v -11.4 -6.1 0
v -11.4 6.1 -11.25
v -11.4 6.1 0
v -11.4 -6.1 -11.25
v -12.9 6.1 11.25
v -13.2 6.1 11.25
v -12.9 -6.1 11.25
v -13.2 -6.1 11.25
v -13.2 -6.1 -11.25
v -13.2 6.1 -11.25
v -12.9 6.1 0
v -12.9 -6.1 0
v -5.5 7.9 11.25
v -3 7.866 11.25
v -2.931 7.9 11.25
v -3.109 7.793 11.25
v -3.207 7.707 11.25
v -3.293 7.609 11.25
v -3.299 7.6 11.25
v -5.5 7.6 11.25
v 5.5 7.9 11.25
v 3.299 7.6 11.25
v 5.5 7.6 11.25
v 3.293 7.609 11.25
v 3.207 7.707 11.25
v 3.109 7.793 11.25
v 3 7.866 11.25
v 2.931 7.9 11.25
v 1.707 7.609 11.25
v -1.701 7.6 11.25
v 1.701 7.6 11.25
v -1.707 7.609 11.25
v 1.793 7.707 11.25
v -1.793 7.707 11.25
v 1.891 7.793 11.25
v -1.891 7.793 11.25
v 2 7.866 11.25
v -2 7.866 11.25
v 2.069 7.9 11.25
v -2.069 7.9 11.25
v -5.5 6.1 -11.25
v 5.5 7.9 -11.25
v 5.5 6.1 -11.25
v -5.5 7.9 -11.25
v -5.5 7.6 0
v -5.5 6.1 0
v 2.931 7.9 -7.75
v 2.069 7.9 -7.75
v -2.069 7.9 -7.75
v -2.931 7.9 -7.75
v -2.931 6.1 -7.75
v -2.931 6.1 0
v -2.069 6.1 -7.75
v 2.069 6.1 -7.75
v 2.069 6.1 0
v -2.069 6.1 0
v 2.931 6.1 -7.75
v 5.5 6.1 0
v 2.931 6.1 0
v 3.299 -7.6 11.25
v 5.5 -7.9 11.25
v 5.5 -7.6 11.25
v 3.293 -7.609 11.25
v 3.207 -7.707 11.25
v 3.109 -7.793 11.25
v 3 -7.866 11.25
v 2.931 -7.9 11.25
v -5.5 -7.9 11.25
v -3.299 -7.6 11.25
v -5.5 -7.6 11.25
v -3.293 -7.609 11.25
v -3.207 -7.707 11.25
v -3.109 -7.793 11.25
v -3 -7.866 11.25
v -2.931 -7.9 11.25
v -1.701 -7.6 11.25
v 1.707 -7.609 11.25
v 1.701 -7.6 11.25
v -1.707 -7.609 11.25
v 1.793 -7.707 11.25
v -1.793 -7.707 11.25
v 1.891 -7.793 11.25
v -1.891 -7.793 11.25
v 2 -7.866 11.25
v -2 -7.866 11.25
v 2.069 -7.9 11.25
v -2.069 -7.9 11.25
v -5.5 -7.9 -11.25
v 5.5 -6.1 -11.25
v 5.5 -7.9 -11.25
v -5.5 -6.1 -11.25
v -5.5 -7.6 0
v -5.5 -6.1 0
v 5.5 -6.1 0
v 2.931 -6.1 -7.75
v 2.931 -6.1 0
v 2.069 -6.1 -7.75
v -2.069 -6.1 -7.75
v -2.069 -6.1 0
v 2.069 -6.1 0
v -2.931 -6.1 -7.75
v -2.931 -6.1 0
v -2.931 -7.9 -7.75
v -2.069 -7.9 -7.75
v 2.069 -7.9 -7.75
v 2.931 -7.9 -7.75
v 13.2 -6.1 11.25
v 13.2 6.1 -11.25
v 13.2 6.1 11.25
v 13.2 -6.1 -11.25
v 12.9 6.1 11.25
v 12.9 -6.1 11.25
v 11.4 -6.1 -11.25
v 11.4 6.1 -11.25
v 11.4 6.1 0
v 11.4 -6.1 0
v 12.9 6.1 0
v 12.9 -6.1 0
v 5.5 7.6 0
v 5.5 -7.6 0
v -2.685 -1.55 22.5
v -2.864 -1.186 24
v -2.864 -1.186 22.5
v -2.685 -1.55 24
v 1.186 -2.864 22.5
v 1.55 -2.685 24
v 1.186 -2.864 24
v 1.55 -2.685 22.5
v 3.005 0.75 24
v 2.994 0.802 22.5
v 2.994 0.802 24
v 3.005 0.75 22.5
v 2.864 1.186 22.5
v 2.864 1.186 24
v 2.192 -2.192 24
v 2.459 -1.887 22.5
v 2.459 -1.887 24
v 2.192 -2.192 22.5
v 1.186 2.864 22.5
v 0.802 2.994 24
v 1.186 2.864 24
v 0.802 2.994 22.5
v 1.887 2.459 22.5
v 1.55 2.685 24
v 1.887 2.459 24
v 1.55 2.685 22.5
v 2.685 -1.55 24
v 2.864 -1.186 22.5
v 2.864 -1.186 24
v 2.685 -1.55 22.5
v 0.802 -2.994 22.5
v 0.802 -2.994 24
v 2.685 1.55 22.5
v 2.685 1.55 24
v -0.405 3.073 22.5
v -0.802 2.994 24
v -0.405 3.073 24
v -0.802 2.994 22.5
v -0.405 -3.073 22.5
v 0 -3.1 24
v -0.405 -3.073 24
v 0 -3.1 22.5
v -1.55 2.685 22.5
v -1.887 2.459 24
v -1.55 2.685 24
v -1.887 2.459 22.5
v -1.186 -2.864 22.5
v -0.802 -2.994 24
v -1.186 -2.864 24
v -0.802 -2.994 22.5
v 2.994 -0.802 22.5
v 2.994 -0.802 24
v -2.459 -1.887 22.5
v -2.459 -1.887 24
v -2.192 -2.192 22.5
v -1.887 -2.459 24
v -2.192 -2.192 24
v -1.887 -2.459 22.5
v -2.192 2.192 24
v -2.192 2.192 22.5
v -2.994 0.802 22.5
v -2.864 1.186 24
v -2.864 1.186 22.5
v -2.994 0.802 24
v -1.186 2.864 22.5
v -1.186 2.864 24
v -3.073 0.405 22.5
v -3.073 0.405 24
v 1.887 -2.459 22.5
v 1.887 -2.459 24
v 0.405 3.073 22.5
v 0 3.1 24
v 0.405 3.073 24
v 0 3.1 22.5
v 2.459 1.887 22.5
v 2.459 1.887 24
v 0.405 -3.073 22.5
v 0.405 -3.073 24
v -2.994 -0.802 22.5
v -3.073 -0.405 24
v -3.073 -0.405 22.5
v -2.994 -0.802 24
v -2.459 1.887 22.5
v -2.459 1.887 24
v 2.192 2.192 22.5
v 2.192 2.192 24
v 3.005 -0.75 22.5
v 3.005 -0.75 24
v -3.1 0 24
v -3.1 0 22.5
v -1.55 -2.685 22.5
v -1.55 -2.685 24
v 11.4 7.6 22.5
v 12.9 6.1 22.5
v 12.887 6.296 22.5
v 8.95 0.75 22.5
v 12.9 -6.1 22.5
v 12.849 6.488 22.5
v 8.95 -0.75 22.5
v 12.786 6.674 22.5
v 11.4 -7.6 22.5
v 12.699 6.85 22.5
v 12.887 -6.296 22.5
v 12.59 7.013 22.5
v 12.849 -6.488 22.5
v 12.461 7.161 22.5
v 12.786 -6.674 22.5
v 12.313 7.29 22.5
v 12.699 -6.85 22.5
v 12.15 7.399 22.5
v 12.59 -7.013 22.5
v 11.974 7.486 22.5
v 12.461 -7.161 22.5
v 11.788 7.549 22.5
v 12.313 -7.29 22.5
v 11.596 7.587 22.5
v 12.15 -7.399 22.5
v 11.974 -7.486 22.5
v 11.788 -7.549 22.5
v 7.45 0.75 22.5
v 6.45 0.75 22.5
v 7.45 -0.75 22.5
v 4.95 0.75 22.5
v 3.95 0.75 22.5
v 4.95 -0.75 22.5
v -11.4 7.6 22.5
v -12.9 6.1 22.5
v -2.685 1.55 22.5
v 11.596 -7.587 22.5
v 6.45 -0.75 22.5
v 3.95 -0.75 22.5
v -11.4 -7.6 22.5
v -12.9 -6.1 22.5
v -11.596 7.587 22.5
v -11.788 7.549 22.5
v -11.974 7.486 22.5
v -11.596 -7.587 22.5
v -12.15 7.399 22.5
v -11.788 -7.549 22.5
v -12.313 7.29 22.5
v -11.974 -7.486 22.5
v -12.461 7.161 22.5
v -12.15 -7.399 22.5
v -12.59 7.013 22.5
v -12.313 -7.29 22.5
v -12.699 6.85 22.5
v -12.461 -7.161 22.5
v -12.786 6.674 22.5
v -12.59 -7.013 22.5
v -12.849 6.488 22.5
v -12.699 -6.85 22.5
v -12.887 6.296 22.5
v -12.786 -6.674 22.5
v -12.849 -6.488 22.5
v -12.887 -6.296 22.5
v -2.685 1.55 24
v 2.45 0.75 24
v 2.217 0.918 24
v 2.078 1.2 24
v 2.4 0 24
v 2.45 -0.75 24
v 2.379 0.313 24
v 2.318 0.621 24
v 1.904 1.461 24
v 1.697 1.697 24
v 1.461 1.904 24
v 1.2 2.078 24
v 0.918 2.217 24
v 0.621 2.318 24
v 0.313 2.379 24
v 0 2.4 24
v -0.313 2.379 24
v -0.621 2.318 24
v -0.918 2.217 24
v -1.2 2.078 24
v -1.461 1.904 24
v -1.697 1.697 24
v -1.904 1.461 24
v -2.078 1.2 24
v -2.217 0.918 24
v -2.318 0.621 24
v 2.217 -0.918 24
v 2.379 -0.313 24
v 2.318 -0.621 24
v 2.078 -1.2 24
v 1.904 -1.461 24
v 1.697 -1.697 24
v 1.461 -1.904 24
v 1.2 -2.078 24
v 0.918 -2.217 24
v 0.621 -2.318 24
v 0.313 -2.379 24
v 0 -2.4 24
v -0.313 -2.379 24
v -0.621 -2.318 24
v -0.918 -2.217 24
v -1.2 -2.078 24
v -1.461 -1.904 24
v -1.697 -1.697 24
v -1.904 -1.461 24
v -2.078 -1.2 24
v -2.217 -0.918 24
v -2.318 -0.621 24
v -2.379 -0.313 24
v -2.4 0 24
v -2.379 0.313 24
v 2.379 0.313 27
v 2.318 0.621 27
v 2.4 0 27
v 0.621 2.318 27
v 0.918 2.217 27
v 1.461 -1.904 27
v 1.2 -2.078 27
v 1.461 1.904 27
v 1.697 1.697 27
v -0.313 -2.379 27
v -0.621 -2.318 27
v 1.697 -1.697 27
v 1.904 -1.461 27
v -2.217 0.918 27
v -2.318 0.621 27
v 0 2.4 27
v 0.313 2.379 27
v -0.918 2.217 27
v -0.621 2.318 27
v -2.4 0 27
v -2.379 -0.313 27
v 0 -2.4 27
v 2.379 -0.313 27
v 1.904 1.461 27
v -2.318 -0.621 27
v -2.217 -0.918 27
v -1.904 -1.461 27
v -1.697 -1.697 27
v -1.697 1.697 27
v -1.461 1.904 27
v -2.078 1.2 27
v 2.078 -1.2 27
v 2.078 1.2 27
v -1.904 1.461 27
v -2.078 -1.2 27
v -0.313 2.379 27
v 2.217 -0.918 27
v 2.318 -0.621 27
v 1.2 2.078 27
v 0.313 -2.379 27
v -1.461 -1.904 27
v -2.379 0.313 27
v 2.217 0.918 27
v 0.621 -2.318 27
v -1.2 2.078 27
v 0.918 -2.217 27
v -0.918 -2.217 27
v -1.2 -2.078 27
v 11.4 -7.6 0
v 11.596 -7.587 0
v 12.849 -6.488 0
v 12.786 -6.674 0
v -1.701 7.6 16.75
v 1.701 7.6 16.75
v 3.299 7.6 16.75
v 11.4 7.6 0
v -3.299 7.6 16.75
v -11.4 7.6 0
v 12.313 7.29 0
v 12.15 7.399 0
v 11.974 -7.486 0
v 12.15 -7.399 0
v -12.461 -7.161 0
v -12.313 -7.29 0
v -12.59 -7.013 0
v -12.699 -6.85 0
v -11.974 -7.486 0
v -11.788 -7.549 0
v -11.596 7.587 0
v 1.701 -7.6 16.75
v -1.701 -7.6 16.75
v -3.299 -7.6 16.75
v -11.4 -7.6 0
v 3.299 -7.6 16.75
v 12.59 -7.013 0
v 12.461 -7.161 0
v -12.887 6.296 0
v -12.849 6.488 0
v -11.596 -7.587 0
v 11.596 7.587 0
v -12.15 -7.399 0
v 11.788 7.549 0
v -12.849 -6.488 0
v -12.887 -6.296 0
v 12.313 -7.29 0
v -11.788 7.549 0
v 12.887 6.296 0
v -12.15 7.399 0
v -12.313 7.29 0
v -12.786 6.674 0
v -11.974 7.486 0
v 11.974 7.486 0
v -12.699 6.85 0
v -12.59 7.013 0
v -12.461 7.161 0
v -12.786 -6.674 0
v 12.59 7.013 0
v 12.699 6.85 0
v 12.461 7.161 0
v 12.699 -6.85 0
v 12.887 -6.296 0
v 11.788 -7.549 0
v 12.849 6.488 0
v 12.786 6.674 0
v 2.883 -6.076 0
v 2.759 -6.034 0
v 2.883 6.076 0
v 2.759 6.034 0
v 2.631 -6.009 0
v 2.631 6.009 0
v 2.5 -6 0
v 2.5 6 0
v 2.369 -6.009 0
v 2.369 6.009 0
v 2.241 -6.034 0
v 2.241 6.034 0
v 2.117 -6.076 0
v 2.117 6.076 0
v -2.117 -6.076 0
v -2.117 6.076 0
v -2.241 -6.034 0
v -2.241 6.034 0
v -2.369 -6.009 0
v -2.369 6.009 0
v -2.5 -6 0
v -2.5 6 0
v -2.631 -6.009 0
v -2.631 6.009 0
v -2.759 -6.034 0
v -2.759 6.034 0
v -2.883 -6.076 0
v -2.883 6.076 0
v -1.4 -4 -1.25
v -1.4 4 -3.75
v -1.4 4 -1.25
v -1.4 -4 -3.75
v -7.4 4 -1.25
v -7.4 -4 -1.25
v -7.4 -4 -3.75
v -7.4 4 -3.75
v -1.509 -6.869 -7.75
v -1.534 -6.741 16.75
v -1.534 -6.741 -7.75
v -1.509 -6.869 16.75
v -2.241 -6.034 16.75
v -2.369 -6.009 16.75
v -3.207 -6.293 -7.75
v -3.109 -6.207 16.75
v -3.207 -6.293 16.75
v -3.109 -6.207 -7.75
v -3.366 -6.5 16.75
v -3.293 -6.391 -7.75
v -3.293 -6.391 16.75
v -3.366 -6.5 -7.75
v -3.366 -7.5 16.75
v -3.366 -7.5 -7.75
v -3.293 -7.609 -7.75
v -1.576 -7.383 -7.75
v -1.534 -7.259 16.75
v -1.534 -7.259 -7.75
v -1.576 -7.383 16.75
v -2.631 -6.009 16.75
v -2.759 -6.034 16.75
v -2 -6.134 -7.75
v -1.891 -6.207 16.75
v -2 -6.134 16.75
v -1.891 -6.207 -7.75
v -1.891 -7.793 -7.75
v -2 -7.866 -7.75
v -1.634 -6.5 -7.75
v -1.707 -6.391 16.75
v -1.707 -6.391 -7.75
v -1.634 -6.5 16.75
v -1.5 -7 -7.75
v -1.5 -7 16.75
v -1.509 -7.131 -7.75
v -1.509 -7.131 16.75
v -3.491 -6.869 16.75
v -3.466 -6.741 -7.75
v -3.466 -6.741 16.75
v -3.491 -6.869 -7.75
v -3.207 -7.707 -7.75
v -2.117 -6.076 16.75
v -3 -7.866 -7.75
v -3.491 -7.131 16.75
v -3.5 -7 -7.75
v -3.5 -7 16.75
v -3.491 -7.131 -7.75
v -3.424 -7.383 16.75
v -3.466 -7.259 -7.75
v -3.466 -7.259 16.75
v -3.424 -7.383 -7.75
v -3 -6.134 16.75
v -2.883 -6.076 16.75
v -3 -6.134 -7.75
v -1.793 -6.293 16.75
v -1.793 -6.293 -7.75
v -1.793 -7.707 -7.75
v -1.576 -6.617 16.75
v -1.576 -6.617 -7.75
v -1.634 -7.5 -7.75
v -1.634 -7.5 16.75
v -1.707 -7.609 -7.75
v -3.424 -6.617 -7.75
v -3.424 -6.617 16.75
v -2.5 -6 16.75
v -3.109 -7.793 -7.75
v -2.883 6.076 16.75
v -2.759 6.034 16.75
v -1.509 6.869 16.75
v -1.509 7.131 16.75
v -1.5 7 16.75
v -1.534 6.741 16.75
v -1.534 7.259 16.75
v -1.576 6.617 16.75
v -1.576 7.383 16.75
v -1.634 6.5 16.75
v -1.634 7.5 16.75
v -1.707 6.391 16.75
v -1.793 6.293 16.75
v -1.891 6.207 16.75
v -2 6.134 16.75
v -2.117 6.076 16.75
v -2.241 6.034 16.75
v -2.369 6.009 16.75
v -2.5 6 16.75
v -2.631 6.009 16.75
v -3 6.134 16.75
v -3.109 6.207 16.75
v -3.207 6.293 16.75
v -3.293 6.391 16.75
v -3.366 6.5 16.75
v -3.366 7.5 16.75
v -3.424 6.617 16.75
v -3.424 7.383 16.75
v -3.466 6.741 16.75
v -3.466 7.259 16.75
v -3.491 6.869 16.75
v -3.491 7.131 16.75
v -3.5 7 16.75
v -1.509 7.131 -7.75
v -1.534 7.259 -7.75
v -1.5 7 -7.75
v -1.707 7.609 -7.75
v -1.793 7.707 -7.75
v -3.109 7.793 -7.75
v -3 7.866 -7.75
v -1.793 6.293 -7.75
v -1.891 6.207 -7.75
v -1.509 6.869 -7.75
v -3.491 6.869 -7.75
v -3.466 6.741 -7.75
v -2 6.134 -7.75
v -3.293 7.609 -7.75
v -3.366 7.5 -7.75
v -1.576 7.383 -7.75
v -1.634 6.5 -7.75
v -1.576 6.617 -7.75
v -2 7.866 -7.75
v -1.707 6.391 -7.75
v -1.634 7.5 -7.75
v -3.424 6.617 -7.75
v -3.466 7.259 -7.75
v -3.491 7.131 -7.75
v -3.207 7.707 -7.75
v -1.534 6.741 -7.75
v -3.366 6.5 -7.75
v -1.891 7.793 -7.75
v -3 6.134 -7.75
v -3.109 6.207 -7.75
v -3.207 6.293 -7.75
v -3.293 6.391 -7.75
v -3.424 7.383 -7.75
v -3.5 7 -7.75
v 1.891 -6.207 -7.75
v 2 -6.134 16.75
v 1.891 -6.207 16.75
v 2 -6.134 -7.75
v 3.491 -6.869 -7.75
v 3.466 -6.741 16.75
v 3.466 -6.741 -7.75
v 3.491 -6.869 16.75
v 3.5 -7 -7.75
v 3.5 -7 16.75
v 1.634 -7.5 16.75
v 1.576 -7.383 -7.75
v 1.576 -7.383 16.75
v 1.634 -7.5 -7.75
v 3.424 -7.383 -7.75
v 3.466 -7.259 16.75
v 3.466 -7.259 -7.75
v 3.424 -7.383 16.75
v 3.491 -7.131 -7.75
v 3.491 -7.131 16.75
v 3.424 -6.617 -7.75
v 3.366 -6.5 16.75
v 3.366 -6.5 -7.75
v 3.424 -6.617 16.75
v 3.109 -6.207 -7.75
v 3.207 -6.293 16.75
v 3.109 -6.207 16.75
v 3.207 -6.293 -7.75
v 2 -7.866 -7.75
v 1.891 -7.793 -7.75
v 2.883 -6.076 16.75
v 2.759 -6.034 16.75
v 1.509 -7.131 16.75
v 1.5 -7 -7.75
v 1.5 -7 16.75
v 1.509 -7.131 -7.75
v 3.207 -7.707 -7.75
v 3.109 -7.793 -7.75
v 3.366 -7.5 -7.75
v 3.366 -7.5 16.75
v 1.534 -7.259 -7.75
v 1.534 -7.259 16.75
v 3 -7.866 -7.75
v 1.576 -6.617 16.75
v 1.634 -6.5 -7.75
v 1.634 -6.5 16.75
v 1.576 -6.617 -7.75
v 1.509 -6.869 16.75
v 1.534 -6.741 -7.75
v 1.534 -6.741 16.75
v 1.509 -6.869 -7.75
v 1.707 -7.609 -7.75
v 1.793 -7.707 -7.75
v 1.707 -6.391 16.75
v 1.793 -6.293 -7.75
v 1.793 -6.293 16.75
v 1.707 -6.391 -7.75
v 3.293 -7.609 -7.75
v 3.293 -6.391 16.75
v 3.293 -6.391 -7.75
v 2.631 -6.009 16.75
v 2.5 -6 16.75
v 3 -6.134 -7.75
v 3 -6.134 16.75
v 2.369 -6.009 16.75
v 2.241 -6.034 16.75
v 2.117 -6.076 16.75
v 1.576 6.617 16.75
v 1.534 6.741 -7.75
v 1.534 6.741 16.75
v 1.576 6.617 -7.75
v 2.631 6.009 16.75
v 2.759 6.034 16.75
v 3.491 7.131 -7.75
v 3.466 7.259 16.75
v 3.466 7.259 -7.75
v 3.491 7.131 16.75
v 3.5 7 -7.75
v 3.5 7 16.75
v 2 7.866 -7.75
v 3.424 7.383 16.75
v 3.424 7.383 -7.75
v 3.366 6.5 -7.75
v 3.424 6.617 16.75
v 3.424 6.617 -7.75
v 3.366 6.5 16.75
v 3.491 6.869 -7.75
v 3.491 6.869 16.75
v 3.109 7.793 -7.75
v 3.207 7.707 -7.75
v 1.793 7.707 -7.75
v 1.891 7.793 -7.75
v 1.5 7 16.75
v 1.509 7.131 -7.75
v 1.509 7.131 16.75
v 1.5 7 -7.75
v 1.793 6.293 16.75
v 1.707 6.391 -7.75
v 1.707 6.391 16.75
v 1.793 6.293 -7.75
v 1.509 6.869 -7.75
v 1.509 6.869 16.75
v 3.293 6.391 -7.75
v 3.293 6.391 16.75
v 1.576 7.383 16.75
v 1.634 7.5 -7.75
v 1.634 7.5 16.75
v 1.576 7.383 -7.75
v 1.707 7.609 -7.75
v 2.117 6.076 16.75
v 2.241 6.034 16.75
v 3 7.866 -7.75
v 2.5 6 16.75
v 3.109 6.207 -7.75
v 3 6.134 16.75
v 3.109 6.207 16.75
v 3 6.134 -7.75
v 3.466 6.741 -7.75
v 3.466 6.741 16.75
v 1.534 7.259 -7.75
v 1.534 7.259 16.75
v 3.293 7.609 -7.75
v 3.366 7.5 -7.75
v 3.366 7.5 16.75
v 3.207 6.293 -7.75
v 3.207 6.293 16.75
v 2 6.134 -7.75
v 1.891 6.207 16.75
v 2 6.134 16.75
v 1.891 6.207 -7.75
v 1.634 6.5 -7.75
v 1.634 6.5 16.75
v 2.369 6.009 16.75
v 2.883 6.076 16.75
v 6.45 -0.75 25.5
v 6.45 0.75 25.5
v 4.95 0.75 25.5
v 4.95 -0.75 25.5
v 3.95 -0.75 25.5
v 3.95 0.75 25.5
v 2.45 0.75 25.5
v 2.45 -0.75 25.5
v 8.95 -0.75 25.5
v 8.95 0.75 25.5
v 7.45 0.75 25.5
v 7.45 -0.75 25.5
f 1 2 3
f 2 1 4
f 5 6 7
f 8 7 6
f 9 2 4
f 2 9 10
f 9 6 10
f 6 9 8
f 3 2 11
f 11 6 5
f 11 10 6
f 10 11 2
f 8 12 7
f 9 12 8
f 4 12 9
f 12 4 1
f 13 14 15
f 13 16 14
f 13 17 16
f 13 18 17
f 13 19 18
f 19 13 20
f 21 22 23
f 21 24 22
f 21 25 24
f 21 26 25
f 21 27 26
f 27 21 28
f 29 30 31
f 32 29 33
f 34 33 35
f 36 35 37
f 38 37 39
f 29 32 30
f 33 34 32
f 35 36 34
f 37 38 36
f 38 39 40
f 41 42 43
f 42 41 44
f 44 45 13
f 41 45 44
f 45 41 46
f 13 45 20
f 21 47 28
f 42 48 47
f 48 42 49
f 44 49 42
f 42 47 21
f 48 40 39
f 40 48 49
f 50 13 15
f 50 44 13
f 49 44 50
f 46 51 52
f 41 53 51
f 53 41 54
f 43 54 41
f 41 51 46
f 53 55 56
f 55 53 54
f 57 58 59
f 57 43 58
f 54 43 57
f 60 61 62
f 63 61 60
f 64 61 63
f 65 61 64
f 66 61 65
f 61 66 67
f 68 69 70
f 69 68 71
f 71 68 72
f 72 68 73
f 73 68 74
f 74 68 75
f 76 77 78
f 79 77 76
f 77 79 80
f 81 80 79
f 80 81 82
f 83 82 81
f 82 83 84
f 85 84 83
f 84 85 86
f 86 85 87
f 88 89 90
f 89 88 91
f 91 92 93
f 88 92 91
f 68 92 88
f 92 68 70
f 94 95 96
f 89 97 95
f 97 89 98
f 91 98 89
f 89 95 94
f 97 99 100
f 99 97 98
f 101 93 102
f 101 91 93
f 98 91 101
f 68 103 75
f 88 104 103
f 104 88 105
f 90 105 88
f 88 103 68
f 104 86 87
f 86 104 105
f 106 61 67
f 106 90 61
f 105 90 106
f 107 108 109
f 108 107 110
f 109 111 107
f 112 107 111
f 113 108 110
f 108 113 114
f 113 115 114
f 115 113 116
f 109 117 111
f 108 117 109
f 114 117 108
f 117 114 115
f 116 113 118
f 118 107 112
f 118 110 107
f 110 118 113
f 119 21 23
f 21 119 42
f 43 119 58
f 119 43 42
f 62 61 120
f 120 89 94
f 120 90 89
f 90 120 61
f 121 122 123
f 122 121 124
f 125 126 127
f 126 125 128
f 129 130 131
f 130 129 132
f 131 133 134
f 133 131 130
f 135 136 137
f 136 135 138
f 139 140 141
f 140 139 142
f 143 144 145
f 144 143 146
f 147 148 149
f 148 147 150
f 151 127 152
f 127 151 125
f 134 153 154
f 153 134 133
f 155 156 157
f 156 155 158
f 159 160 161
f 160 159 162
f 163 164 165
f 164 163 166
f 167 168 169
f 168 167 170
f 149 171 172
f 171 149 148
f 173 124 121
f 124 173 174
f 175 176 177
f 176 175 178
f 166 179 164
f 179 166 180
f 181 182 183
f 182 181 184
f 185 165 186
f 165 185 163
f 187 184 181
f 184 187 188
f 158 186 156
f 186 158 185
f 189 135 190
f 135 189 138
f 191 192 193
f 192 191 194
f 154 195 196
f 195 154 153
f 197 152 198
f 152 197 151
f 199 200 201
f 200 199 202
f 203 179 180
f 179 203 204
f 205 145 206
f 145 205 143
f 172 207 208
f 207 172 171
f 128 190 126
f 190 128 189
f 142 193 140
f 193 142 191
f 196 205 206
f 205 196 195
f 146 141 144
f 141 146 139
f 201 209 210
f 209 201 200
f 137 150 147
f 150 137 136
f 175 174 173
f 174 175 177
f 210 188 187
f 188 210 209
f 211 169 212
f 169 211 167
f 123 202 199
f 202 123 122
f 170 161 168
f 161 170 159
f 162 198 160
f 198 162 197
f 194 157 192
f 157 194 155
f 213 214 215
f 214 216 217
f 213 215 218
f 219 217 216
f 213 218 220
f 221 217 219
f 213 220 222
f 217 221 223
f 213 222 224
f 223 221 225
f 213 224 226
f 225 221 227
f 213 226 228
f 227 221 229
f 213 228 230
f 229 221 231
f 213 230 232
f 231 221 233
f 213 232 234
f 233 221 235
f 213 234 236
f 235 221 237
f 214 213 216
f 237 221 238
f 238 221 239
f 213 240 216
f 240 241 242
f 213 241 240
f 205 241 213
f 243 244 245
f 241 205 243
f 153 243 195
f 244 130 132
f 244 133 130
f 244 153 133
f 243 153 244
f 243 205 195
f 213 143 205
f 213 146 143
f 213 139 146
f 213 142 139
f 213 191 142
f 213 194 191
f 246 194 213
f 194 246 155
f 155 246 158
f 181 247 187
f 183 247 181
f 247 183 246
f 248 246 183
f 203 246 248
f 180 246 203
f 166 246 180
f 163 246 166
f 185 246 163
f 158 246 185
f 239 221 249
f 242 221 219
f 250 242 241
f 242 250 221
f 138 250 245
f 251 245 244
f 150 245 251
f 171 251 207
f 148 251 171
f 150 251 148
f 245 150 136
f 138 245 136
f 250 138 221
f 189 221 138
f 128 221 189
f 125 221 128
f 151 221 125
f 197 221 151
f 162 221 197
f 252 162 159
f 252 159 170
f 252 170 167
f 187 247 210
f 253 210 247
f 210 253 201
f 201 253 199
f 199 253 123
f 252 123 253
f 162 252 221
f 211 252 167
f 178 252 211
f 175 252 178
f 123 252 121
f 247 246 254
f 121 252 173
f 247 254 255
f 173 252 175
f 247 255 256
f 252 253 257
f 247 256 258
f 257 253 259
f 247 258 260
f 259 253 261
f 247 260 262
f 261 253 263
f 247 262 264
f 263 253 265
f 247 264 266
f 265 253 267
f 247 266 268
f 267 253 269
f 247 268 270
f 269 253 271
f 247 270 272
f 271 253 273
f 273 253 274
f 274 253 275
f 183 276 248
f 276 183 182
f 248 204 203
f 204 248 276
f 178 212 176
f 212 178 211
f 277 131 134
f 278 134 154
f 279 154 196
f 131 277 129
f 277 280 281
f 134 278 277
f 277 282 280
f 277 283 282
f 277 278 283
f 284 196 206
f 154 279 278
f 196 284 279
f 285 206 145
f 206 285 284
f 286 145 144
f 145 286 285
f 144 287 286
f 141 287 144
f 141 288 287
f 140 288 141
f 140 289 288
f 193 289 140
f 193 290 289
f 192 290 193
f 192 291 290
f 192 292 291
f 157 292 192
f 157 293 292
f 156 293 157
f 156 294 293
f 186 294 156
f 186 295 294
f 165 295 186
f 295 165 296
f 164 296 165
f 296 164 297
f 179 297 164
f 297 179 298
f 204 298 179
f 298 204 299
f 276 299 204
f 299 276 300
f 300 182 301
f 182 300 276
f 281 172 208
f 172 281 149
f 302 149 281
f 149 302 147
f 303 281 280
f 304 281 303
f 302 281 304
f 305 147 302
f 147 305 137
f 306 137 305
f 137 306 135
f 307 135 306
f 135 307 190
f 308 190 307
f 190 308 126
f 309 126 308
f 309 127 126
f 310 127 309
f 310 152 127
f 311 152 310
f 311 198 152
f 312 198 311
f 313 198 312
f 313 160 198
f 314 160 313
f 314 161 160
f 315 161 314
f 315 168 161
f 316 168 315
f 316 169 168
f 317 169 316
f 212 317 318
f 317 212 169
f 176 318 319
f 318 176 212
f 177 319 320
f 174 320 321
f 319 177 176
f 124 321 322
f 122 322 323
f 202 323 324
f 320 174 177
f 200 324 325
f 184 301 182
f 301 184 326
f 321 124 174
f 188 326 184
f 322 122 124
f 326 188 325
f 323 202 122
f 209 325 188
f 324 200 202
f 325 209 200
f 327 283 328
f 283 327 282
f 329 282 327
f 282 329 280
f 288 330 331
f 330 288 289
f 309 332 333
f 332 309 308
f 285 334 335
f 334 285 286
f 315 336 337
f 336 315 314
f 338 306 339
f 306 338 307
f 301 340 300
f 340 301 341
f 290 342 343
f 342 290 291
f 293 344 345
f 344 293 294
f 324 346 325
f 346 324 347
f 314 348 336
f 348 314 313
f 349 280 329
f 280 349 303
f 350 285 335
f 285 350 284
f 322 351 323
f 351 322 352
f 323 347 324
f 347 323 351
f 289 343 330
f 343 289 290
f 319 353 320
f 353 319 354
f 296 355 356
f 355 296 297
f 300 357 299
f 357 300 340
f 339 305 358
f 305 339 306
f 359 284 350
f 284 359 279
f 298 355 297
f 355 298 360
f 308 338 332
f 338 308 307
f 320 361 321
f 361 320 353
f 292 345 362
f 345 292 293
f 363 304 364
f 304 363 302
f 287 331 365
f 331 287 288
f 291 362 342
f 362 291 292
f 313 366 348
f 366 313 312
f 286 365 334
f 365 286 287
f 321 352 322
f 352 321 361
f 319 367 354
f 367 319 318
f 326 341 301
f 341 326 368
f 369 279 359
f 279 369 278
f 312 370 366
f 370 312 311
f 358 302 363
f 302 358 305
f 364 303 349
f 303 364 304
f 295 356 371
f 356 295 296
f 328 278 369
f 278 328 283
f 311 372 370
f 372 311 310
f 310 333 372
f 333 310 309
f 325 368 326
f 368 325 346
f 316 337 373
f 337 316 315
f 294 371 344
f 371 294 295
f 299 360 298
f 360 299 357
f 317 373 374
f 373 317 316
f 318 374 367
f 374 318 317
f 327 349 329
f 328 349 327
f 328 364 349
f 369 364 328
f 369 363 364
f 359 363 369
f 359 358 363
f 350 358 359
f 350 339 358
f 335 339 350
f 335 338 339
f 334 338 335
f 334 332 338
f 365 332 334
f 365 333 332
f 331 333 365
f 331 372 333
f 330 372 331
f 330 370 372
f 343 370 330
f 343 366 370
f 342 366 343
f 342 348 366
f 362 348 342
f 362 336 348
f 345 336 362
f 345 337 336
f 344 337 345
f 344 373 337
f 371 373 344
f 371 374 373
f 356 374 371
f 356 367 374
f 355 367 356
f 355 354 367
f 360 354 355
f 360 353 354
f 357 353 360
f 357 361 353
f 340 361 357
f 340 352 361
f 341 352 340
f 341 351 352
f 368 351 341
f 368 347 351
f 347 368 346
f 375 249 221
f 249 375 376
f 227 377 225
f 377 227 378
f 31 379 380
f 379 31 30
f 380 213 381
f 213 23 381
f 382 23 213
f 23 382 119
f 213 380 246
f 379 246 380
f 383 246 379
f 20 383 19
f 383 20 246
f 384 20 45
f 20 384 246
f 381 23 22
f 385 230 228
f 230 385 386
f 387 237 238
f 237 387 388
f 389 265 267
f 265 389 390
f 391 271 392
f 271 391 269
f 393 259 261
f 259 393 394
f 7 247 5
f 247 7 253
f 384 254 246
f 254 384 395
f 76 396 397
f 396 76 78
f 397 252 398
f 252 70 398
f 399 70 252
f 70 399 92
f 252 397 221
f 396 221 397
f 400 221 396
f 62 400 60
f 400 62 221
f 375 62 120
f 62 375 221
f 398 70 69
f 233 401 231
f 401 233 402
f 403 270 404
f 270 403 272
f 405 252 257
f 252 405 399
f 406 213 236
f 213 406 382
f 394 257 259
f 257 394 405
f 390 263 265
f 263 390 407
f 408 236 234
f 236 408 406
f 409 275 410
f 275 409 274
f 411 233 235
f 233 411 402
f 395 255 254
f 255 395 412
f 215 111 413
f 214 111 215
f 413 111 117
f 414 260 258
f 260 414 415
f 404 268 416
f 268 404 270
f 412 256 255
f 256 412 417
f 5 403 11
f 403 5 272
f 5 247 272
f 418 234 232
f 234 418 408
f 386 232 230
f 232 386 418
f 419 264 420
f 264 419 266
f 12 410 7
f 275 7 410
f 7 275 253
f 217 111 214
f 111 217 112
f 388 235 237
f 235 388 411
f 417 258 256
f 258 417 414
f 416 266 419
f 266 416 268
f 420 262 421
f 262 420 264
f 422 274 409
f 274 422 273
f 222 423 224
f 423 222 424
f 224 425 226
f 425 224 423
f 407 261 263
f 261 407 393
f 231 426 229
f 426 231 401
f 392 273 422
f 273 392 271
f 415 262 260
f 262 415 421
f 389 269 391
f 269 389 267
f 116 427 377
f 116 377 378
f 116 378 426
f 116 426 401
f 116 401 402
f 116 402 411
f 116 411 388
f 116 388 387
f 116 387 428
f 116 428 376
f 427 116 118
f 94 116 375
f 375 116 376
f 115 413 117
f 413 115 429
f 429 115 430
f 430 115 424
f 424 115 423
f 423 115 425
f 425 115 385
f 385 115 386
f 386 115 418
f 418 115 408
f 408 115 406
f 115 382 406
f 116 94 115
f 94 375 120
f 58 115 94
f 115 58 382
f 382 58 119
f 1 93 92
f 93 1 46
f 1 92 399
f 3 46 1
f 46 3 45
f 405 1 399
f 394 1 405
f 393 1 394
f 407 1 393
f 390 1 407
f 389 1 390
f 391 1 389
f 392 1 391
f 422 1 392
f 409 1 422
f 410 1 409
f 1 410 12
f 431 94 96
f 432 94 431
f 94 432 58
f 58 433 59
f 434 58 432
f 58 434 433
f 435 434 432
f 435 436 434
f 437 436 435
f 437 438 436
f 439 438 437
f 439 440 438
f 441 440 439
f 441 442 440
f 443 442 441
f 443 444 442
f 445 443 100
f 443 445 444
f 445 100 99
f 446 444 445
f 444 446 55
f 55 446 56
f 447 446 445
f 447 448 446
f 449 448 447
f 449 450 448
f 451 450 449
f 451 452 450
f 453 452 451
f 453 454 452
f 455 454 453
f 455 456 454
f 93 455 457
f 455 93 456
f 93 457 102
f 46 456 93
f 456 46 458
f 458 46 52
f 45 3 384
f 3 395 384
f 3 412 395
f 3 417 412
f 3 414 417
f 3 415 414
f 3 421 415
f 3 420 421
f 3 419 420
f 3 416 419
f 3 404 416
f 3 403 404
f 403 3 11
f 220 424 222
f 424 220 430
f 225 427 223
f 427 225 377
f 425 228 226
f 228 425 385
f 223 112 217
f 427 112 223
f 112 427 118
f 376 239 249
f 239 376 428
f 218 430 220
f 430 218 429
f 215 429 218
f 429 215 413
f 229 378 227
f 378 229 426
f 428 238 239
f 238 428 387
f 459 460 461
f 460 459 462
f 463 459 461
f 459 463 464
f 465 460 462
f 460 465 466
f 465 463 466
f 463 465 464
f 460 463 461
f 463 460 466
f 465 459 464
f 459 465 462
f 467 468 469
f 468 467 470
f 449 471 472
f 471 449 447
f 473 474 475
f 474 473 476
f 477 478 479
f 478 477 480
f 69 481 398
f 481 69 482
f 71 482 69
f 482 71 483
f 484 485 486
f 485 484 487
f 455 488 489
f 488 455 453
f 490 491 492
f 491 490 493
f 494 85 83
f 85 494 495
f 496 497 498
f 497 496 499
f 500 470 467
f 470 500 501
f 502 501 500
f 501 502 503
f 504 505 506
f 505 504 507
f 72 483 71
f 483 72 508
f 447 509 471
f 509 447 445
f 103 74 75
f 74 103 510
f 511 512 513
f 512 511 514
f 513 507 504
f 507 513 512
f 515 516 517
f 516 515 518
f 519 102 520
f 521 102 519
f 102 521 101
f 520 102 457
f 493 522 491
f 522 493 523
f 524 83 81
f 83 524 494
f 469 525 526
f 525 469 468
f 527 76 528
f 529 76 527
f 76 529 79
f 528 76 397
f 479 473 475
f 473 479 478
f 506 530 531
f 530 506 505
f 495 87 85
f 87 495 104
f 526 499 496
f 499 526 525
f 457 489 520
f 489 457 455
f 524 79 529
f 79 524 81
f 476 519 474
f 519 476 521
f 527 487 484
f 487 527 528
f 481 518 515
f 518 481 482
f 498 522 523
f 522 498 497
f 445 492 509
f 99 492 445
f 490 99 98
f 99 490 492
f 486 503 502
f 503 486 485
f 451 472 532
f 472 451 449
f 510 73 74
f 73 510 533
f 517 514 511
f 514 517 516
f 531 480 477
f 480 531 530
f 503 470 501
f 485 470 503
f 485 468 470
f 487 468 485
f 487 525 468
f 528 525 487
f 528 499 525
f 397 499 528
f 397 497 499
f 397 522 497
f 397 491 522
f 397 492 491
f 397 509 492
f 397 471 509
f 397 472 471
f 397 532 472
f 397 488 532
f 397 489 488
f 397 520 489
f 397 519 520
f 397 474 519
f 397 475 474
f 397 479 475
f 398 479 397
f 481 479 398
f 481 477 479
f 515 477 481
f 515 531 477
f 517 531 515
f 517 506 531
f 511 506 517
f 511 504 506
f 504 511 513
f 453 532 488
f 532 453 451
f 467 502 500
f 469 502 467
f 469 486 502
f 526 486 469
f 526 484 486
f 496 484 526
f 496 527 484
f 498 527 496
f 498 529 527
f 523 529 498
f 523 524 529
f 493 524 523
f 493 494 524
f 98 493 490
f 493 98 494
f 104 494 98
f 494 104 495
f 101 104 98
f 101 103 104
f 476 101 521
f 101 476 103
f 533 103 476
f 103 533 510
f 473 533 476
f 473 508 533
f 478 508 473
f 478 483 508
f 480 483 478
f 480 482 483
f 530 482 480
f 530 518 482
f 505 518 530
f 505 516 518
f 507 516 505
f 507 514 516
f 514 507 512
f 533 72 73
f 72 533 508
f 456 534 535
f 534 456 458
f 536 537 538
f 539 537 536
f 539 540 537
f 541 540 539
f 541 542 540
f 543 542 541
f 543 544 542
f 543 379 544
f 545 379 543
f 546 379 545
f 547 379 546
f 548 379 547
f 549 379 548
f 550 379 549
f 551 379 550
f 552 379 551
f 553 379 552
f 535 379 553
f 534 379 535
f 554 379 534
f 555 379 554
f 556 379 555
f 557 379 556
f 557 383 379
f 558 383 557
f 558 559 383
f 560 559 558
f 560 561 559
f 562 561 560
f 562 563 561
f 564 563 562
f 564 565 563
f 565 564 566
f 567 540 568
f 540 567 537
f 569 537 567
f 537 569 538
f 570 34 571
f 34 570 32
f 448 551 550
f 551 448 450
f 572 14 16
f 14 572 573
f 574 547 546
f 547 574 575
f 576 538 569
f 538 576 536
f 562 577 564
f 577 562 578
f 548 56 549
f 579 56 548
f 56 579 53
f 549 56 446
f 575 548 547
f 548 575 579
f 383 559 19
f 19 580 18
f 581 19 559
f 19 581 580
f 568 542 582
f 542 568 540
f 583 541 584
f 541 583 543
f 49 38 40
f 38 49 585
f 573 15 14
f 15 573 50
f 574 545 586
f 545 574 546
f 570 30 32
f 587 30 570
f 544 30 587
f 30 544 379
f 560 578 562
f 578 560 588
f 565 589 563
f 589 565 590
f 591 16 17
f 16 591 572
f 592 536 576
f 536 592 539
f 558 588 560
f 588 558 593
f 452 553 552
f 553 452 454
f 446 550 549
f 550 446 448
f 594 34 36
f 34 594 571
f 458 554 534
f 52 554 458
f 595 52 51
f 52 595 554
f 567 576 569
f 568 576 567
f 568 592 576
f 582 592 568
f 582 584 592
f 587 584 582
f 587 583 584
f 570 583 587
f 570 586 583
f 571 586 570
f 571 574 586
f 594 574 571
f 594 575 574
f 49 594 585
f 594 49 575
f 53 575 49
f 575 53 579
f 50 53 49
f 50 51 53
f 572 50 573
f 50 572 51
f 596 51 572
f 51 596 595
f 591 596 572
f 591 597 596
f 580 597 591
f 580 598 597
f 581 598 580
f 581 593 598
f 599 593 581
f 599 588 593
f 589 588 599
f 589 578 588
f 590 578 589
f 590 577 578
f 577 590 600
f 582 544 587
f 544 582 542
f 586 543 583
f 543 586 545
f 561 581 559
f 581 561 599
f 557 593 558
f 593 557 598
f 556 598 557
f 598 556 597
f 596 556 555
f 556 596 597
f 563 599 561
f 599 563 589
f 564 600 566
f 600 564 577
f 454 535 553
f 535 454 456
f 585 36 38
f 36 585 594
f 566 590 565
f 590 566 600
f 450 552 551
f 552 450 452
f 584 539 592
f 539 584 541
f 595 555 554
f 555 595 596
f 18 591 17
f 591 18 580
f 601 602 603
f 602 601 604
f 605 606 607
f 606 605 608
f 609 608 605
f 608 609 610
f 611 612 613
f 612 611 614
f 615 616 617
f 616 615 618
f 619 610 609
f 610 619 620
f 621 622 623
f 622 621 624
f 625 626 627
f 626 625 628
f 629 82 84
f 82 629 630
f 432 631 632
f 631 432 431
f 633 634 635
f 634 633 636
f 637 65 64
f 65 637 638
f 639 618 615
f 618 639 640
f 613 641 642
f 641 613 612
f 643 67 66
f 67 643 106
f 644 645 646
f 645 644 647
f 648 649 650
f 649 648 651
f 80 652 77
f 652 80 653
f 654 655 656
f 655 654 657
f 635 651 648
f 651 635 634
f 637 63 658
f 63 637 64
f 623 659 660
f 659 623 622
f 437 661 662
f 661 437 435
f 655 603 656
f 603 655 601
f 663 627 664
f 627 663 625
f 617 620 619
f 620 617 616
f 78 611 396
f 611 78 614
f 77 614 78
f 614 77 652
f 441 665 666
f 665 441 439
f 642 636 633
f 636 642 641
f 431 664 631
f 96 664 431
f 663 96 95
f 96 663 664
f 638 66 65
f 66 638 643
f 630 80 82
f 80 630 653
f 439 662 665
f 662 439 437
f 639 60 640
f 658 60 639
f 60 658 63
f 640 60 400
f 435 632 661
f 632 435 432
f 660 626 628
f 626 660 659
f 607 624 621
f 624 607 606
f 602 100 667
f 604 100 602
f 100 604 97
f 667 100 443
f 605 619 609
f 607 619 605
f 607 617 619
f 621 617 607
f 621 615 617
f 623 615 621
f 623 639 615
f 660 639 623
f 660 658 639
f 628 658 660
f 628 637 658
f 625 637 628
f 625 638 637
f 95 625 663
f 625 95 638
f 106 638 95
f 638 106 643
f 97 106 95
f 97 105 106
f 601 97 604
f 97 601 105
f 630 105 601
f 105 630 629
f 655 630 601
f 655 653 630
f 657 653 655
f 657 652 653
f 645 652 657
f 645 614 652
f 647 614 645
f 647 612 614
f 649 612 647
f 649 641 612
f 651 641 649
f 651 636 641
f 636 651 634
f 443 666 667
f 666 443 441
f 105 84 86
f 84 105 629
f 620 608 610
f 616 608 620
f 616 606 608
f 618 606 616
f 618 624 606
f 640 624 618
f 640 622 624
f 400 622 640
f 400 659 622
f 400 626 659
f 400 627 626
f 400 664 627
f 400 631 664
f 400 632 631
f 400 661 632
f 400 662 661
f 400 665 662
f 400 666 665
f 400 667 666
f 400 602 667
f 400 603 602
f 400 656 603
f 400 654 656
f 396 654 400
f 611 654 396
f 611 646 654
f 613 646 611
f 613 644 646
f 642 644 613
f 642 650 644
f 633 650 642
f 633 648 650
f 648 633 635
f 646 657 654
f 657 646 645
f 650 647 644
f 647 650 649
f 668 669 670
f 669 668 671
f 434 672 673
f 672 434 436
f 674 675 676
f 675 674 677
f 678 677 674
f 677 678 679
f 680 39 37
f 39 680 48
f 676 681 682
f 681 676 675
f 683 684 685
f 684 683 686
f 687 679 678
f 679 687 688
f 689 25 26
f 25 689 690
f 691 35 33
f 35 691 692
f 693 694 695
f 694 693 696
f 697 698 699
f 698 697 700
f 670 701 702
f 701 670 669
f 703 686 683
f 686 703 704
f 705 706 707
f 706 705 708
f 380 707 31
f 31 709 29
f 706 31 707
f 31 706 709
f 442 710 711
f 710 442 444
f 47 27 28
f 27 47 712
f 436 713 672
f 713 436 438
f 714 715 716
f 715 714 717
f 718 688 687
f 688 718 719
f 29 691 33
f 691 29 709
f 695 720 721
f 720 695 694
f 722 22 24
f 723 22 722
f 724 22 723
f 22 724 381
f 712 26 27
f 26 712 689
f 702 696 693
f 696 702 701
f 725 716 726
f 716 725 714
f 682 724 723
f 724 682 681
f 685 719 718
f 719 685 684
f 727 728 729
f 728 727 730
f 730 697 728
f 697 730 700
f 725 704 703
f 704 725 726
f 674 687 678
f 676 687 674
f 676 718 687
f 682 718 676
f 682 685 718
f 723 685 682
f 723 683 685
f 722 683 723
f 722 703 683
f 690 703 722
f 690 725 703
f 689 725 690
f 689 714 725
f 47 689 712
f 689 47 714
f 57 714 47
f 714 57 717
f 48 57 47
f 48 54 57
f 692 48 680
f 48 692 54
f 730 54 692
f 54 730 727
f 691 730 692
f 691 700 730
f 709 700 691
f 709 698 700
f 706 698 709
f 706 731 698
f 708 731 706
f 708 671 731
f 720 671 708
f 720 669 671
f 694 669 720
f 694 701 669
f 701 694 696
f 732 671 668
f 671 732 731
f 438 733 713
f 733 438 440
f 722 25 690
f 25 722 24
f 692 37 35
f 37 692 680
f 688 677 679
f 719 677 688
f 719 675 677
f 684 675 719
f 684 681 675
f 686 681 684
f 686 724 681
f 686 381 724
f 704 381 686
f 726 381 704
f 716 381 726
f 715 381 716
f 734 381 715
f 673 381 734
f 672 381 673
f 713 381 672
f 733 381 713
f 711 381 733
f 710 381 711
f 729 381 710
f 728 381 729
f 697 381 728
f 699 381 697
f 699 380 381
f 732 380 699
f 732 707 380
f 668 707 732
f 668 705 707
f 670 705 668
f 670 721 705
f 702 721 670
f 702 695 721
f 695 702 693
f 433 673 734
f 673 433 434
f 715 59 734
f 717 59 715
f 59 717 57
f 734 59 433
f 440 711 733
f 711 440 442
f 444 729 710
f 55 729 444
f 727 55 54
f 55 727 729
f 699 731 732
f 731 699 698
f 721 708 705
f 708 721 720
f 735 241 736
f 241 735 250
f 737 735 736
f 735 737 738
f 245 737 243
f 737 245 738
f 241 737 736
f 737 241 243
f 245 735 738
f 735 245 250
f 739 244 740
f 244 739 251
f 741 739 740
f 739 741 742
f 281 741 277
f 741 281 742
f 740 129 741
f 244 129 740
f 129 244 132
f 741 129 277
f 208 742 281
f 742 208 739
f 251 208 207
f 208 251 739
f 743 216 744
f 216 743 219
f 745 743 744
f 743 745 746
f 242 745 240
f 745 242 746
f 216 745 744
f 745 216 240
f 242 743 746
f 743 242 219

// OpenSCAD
// MG90S Micro Servo — parametric model (mop lift servo for OOMWOO)
// ===============================================================
// Source: Tower Pro MG90S datasheet / multiple vendor spec sheets
//   - Body (w/o ears): ~22.8 × 12.2 × 22.5 mm
//   - With mounting ears: ~32.2 × 12.2 × 28.5 mm (L×W×H)
//   - Splined output shaft: ~Φ4.8 mm (25T spline)
//   - Mounting: 4× ear holes, M2 typical, ~46.5 mm diag spread
//   - Used for: 2x mop lift servos (mop motor assembly)
// ===============================================================
// Status: DRAFT — datasheet-based, UNVERIFIED against real part.
// See MEASURE-ME.md for caliper checks needed.

/* [Dimensions — verify against real part] */
body_w         = 12.2;    // body width (mm)
body_d         = 22.8;    // body depth (front-to-back, mm)
body_h         = 22.5;    // body height excluding ears (mm)
ear_thick      = 1.8;     // mounting ear thickness (mm)
ear_width      = 6.0;     // mounting ear width (mm)
ear_offset     = 2.5;     // ear inset from body edge
ear_hole_d     = 2.0;     // mounting hole diameter (M2)
ear_hole_y     = 4.5;     // hole center from ear base (mm)
body_round_r   = 1.5;     // body corner rounding (approximate)

spline_d       = 4.8;     // output spline diameter (mm)
spline_h       = 3.0;     // spline height from body (mm)
spline_collar_d = 6.2;    // collar below spline (mm)
spline_collar_h = 1.5;    // collar height (mm)

// Connector protrusion (bottom)
conn_h         = 2.5;     // connector height below body (mm)
conn_w         = 8.0;     // connector width (mm)
conn_d         = 6.0;     // connector depth (mm)
conn_offset    = 4.0;     // connector offset from body edge

// Wire exit (top)
wire_h         = 3.0;     // wire exit height above body (mm)
wire_w         = 6.0;     // wire exit width (mm)

$fn = 48;

module mg90s_body() {
    color("Black") {
        linear_extrude(height=body_h)
            offset(r=body_round_r)
                square([body_d, body_w], center=true);
    }
}

module mg90s_ears() {
    color("Black") {
        for (side = [-1, 1]) {
            // Left and right ears (on depth axis)
            translate([side * (body_d/2 + ear_thick/2), 0, 0])
                cube([ear_thick, body_w, body_h], center=true);
            
            // Extended ear tabs front/back?
            // Standard MG90S has 2 pairs of ears (4 holes total)
            // Front ears:
            translate([
                side * ear_offset,
                body_w/2 + ear_thick/2,
                0
            ]) cube([ear_width, ear_thick, body_h], center=true);
            
            // Rear ears: some have a pair on each side
            translate([
                side * ear_offset,
                -body_w/2 - ear_thick/2,
                0
            ]) cube([ear_width, ear_thick, body_h], center=true);
        }
    }
}

module mg90s_ear_holes() {
    for (xs = [-1, 1], ys = [-1, 1]) {
        translate([
            xs * ear_offset,
            ys * (body_w/2 + ear_thick/2),
            ear_hole_y
        ]) {
            cylinder(d=ear_hole_d, h=body_h+2, center=true);
        }
    }
}

module mg90s_output_shaft() {
    color("Silver") {
        // Collar
        translate([0, 0, body_h])
            cylinder(d=spline_collar_d, h=spline_collar_h);
        // Spline (approximate as cylinder)
        translate([0, 0, body_h + spline_collar_h])
            cylinder(d=spline_d, h=spline_h);
    }
}

module mg90s_connector() {
    color("DarkGray") {
        translate([conn_offset - body_d/2 + conn_d/2, 0, -conn_h])
            cube([conn_d, conn_w, conn_h], center=true);
    }
}

module mg90s_servo() {
    difference() {
        union() {
            mg90s_body();
            mg90s_ears();
            mg90s_output_shaft();
            mg90s_connector();
        }
        mg90s_ear_holes();
    }
    // Wires (approximate)
    color("Red")
        translate([body_d/4, 0, body_h + wire_h/2])
            cube([1.5, 1.5, wire_h], center=true);
    color("Brown")
        translate([body_d/4 - 2.5, 0, body_h + wire_h/2])
            cube([1.5, 1.5, wire_h], center=true);
    color("Orange")
        translate([body_d/4 + 2.5, 0, body_h + wire_h/2])
            cube([1.5, 1.5, wire_h], center=true);
}

mg90s_servo();

echo("MG90S servo body:", body_d, "x", body_w, "x", body_h, "mm");
echo("Spline Φ", spline_d, "mm w/ collar Φ", spline_collar_d, "mm");
